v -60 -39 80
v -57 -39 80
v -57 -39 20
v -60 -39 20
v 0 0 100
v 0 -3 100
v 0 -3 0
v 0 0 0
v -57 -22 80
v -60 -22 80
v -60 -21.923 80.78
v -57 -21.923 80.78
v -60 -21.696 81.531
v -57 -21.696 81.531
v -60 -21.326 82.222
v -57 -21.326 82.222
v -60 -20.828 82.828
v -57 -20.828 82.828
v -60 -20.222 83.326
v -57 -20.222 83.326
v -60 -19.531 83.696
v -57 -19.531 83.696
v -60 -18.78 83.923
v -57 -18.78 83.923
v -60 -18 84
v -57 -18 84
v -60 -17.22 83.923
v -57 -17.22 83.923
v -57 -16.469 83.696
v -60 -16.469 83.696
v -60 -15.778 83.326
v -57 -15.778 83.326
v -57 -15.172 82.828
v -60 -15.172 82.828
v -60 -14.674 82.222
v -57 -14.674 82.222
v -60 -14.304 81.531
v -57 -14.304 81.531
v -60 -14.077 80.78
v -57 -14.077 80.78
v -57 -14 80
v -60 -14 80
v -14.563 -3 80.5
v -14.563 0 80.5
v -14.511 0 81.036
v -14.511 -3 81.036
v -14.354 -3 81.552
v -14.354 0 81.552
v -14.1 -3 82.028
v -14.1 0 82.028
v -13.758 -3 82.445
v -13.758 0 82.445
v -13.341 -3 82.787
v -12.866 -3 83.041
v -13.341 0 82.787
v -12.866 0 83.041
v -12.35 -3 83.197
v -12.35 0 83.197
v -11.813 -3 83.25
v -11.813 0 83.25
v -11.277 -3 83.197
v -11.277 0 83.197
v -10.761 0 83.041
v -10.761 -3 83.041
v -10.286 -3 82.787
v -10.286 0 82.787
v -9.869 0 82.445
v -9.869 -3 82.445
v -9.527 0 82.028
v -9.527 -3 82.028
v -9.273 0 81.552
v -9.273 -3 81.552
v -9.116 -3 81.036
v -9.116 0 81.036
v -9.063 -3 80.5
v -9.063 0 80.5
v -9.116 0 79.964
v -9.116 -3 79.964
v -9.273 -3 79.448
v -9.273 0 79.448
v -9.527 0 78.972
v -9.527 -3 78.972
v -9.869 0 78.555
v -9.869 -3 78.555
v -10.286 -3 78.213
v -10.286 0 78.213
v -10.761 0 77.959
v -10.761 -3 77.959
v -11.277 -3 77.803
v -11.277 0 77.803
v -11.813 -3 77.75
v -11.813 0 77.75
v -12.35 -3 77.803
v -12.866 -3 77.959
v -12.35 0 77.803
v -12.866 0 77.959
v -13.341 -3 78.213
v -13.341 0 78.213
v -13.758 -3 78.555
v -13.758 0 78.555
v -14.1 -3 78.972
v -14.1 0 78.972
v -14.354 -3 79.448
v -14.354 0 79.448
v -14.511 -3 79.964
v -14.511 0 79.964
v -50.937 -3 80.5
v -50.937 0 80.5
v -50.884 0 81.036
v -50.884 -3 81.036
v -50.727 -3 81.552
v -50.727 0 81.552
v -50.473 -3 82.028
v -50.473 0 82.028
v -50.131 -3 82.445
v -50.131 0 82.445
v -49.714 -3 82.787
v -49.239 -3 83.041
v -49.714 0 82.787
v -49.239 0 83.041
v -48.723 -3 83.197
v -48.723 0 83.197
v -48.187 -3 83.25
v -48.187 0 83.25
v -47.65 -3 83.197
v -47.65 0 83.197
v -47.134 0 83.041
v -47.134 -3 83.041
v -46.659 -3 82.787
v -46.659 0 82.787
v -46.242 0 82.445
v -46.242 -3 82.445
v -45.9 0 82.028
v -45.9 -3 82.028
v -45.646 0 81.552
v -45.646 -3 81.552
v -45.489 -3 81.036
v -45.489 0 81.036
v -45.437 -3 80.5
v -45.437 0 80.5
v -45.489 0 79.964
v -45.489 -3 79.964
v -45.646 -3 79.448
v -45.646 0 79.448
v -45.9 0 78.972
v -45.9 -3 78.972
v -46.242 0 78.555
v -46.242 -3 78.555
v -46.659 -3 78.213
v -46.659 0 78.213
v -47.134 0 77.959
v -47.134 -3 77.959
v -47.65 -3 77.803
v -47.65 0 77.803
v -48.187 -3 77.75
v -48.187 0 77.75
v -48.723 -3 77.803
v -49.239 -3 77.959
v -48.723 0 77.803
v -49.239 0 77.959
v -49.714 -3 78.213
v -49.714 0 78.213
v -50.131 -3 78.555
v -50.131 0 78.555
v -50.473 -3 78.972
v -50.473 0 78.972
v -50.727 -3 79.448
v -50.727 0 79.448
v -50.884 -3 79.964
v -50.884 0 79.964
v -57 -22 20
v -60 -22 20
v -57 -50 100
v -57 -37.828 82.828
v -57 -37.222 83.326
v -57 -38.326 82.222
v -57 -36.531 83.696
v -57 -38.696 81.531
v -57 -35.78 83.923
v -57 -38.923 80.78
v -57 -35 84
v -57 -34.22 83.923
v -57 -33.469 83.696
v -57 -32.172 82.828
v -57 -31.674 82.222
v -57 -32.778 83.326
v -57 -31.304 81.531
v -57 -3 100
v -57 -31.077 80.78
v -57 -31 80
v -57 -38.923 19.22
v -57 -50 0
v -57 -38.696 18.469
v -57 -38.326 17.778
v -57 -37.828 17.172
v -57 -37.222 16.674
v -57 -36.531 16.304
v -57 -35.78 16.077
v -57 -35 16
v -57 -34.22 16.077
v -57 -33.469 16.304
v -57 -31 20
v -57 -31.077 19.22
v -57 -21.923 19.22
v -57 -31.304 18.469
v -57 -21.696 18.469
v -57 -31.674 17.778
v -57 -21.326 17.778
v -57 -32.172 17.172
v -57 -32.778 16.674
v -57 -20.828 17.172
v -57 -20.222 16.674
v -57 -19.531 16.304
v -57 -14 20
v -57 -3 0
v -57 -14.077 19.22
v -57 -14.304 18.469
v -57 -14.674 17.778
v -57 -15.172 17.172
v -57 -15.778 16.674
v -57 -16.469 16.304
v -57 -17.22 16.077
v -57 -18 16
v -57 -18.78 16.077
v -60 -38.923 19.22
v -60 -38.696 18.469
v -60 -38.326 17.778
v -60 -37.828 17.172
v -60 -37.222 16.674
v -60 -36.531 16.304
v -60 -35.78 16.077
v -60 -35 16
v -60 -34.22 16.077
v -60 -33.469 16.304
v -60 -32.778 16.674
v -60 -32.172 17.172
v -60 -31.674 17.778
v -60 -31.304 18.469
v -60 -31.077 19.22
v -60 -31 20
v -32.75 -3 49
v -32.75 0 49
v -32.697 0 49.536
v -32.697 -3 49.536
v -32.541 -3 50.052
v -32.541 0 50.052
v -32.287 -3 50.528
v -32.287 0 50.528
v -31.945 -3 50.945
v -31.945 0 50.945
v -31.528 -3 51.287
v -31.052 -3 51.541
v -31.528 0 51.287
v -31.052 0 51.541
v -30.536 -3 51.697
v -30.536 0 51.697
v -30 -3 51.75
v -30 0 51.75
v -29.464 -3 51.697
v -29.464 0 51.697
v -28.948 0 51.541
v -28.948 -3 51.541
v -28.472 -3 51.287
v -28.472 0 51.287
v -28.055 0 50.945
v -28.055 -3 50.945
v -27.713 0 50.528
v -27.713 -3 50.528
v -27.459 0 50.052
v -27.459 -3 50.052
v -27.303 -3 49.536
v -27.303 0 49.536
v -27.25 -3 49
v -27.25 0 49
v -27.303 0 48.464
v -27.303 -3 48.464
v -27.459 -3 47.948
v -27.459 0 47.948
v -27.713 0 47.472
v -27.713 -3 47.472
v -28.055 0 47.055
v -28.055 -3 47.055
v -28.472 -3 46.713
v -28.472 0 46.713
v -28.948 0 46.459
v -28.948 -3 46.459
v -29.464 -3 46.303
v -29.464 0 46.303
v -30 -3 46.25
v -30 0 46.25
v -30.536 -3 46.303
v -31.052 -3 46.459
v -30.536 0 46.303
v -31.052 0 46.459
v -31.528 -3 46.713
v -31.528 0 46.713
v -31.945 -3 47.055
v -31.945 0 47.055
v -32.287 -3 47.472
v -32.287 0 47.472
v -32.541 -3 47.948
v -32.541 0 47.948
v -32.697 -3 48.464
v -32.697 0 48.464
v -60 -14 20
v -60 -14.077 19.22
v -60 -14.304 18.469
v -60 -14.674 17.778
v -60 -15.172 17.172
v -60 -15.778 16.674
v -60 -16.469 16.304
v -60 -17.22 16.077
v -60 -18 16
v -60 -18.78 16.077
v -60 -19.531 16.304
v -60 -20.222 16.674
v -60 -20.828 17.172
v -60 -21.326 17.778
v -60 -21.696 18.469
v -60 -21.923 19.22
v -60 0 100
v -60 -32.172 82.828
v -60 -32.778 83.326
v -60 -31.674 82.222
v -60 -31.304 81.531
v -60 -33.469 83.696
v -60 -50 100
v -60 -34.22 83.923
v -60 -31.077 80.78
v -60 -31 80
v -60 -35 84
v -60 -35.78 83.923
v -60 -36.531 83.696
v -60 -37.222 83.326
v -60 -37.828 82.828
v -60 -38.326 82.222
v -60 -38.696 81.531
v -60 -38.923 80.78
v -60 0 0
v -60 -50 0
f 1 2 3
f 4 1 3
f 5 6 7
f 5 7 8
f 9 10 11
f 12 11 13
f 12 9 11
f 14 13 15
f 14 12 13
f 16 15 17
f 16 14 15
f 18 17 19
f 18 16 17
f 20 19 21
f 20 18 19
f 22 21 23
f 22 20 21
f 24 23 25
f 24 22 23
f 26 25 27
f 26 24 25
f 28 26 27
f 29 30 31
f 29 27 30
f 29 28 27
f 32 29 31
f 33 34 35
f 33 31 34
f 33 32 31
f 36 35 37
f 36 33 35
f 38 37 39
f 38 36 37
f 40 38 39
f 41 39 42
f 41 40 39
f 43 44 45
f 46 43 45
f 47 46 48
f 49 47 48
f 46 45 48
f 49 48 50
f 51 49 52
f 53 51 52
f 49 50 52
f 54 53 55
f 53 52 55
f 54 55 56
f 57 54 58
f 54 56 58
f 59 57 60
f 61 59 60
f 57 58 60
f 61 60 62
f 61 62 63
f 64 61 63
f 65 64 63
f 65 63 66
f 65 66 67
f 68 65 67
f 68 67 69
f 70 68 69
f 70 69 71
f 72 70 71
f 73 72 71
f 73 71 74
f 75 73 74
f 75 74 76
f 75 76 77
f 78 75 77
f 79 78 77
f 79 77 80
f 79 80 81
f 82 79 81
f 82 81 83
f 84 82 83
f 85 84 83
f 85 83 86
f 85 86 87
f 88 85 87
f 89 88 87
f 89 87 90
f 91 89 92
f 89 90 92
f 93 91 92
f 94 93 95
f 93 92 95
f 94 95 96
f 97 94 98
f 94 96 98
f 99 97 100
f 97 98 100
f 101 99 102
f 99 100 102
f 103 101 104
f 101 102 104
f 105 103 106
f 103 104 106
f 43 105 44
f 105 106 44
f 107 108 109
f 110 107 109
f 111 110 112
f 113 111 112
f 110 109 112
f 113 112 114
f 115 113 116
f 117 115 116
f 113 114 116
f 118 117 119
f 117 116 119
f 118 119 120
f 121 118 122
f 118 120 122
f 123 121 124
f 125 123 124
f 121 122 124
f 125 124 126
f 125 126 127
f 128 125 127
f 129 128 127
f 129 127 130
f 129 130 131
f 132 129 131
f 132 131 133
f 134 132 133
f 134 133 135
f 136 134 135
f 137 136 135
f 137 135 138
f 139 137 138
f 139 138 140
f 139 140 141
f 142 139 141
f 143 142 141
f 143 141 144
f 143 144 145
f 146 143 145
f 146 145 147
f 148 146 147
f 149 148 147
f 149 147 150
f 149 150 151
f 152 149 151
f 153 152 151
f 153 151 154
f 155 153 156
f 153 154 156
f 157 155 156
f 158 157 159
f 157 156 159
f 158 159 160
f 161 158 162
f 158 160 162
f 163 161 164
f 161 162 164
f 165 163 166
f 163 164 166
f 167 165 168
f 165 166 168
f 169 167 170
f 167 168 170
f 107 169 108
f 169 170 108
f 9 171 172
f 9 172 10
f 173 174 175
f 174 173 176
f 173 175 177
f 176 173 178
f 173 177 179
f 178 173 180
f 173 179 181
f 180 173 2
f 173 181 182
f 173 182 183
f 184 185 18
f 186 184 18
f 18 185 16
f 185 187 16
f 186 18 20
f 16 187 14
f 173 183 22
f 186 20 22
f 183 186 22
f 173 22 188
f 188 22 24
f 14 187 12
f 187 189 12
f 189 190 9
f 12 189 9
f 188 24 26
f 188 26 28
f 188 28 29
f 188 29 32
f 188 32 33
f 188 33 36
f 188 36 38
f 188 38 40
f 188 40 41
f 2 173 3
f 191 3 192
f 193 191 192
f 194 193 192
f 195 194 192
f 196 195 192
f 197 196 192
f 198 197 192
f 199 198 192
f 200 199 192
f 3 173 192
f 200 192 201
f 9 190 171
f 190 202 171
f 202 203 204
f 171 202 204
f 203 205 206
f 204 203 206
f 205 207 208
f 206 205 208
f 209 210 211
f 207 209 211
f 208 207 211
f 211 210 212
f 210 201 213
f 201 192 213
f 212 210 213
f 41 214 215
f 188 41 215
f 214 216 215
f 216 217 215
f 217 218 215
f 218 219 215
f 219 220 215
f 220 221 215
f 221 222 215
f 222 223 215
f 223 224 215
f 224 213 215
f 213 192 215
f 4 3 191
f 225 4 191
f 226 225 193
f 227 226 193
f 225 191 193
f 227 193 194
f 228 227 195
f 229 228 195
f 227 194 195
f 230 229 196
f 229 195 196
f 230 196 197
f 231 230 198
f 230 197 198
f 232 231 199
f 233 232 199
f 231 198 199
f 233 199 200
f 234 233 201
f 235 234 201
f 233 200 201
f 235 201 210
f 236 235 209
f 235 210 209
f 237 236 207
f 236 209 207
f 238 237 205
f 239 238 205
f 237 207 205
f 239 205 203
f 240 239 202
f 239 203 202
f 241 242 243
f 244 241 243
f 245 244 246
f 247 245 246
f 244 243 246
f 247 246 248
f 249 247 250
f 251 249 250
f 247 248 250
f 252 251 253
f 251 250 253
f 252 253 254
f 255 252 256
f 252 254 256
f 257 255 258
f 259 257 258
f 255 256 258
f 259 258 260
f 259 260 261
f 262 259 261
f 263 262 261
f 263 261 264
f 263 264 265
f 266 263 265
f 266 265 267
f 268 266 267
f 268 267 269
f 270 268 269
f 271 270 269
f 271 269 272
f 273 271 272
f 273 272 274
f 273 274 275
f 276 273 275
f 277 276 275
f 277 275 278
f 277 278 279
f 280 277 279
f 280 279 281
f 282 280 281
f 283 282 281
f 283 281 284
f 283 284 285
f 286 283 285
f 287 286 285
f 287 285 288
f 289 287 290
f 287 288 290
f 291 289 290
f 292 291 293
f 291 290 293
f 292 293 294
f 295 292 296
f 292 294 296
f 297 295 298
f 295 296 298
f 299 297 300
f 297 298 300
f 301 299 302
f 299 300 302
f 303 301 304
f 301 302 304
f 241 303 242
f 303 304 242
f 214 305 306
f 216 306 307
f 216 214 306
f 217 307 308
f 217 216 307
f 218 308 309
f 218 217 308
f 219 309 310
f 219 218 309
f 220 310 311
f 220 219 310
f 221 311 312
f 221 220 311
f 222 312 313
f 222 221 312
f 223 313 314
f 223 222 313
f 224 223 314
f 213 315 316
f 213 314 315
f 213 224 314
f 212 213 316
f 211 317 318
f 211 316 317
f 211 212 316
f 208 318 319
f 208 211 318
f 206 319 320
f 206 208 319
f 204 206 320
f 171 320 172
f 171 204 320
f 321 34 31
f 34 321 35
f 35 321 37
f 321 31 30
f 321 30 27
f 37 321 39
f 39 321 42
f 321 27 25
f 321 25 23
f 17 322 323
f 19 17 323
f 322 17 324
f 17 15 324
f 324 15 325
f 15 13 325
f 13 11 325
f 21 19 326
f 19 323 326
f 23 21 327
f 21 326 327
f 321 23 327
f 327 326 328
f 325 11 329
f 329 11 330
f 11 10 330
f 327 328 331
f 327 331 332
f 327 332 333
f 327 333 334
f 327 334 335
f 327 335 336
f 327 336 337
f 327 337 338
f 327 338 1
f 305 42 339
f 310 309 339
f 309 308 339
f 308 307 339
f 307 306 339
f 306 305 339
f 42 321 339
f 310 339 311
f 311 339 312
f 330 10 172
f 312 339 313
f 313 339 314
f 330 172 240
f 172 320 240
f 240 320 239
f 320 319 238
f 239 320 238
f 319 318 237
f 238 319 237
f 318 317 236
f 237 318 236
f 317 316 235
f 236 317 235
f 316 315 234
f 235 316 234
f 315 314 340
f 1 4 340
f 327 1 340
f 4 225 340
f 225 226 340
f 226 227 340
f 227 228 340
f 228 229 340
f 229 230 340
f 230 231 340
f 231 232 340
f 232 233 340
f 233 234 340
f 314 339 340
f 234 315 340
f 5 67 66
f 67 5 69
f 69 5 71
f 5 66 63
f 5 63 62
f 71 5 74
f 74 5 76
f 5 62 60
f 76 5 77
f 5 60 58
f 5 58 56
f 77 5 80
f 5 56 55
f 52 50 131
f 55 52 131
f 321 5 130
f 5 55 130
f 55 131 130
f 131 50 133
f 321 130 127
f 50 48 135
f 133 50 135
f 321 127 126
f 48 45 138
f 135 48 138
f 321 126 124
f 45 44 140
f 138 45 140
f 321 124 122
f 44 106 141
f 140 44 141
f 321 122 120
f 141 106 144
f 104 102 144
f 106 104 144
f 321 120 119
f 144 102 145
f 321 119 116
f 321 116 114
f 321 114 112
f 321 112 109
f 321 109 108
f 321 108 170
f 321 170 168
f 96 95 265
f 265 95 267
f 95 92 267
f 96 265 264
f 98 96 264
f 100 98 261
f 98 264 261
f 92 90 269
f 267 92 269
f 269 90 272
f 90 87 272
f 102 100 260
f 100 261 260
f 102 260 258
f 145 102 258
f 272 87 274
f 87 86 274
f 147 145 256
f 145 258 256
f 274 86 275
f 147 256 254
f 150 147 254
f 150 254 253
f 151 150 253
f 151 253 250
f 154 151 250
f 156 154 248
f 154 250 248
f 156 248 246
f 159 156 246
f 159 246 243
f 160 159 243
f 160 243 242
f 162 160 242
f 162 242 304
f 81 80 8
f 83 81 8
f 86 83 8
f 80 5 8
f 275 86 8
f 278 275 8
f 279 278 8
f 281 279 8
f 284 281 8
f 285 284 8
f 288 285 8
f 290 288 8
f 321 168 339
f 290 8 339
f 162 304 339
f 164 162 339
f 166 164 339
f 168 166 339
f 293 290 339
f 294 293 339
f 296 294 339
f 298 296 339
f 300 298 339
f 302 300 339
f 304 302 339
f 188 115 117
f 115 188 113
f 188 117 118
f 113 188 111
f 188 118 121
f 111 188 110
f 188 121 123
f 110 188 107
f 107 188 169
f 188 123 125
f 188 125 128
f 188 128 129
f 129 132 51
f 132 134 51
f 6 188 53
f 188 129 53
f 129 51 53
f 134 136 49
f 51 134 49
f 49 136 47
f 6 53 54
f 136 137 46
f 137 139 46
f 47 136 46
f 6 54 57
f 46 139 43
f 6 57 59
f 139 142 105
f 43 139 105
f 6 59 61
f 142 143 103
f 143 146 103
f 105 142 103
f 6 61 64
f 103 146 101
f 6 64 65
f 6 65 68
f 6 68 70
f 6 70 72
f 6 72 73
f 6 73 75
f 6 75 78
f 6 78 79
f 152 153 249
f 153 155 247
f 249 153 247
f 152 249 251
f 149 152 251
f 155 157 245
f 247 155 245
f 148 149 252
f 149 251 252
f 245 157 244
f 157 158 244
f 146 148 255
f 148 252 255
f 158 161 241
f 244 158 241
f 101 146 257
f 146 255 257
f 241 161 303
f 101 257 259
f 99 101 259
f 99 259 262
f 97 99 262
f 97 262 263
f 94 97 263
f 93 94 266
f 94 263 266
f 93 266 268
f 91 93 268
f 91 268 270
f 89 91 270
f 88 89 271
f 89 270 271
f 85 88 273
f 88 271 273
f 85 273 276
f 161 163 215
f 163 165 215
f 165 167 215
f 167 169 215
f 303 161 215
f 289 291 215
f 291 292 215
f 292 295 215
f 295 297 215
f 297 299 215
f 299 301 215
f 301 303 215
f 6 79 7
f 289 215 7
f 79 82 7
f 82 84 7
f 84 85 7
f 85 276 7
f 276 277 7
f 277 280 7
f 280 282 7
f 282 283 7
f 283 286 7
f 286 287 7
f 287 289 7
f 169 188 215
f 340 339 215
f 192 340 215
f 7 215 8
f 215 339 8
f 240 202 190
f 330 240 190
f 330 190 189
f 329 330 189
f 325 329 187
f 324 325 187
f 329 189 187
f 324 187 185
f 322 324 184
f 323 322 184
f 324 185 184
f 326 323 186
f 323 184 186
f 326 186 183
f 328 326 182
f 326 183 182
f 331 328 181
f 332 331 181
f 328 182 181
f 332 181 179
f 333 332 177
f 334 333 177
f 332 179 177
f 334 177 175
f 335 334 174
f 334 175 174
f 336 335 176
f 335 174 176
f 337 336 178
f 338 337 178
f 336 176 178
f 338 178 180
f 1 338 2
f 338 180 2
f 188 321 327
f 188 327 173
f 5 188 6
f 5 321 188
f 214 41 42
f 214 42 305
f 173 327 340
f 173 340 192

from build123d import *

# Parameters (mm, degrees)
BOSS_EXTRUDE1_DEPTH = 100
SKETCH2_R           = 2.75
CUT_EXTRUDE1_DEPTH  = 100
CUT_EXTRUDE2_DEPTH  = 100


with BuildPart() as part:
    # Sketch1 → Boss-Extrude1 (new body)
    with BuildSketch(Plane.XY):
        Polygon((0, 0), (-60, 0), (-60, -50), (-57, -50), (-57, -3), (0, -3), align=None)
    extrude(amount=BOSS_EXTRUDE1_DEPTH)

    # Sketch2 → Cut-Extrude1 (cut)
    with BuildSketch(Plane(origin=(0, 0, 0), x_dir=(1, 0, 0), z_dir=(0, 1, 0))):
        with Locations(Location((-11.813466521, -80.5, 0), (0, 0, 180))):
            Circle(SKETCH2_R)
        with Locations(Location((-48.186533479, -80.5, 0), (0, 0, 180))):
            Circle(SKETCH2_R)
        with Locations(Location((-30, -49, 0), (0, 0, 180))):
            Circle(SKETCH2_R)
    extrude(amount=-CUT_EXTRUDE1_DEPTH, mode=Mode.SUBTRACT)

    # Sketch3 → Cut-Extrude2 (cut)
    with BuildSketch(Plane(origin=(-57, 0, 0), x_dir=(0, 0, -1), z_dir=(1, 0, 0))):
        with BuildLine():
            Line((-80, -14), (-20, -14))
            ThreePointArc((-20, -14), (-16, -18), (-20, -22))
            Line((-20, -22), (-80, -22))
            ThreePointArc((-80, -22), (-84, -18), (-80, -14))
        make_face()
        with BuildLine():
            Line((-80, -39), (-20, -39))
            ThreePointArc((-20, -39), (-16, -35), (-20, -31))
            Line((-20, -31), (-80, -31))
            ThreePointArc((-80, -31), (-84, -35), (-80, -39))
        make_face()
    extrude(amount=-CUT_EXTRUDE2_DEPTH, mode=Mode.SUBTRACT)


solid = part.part
